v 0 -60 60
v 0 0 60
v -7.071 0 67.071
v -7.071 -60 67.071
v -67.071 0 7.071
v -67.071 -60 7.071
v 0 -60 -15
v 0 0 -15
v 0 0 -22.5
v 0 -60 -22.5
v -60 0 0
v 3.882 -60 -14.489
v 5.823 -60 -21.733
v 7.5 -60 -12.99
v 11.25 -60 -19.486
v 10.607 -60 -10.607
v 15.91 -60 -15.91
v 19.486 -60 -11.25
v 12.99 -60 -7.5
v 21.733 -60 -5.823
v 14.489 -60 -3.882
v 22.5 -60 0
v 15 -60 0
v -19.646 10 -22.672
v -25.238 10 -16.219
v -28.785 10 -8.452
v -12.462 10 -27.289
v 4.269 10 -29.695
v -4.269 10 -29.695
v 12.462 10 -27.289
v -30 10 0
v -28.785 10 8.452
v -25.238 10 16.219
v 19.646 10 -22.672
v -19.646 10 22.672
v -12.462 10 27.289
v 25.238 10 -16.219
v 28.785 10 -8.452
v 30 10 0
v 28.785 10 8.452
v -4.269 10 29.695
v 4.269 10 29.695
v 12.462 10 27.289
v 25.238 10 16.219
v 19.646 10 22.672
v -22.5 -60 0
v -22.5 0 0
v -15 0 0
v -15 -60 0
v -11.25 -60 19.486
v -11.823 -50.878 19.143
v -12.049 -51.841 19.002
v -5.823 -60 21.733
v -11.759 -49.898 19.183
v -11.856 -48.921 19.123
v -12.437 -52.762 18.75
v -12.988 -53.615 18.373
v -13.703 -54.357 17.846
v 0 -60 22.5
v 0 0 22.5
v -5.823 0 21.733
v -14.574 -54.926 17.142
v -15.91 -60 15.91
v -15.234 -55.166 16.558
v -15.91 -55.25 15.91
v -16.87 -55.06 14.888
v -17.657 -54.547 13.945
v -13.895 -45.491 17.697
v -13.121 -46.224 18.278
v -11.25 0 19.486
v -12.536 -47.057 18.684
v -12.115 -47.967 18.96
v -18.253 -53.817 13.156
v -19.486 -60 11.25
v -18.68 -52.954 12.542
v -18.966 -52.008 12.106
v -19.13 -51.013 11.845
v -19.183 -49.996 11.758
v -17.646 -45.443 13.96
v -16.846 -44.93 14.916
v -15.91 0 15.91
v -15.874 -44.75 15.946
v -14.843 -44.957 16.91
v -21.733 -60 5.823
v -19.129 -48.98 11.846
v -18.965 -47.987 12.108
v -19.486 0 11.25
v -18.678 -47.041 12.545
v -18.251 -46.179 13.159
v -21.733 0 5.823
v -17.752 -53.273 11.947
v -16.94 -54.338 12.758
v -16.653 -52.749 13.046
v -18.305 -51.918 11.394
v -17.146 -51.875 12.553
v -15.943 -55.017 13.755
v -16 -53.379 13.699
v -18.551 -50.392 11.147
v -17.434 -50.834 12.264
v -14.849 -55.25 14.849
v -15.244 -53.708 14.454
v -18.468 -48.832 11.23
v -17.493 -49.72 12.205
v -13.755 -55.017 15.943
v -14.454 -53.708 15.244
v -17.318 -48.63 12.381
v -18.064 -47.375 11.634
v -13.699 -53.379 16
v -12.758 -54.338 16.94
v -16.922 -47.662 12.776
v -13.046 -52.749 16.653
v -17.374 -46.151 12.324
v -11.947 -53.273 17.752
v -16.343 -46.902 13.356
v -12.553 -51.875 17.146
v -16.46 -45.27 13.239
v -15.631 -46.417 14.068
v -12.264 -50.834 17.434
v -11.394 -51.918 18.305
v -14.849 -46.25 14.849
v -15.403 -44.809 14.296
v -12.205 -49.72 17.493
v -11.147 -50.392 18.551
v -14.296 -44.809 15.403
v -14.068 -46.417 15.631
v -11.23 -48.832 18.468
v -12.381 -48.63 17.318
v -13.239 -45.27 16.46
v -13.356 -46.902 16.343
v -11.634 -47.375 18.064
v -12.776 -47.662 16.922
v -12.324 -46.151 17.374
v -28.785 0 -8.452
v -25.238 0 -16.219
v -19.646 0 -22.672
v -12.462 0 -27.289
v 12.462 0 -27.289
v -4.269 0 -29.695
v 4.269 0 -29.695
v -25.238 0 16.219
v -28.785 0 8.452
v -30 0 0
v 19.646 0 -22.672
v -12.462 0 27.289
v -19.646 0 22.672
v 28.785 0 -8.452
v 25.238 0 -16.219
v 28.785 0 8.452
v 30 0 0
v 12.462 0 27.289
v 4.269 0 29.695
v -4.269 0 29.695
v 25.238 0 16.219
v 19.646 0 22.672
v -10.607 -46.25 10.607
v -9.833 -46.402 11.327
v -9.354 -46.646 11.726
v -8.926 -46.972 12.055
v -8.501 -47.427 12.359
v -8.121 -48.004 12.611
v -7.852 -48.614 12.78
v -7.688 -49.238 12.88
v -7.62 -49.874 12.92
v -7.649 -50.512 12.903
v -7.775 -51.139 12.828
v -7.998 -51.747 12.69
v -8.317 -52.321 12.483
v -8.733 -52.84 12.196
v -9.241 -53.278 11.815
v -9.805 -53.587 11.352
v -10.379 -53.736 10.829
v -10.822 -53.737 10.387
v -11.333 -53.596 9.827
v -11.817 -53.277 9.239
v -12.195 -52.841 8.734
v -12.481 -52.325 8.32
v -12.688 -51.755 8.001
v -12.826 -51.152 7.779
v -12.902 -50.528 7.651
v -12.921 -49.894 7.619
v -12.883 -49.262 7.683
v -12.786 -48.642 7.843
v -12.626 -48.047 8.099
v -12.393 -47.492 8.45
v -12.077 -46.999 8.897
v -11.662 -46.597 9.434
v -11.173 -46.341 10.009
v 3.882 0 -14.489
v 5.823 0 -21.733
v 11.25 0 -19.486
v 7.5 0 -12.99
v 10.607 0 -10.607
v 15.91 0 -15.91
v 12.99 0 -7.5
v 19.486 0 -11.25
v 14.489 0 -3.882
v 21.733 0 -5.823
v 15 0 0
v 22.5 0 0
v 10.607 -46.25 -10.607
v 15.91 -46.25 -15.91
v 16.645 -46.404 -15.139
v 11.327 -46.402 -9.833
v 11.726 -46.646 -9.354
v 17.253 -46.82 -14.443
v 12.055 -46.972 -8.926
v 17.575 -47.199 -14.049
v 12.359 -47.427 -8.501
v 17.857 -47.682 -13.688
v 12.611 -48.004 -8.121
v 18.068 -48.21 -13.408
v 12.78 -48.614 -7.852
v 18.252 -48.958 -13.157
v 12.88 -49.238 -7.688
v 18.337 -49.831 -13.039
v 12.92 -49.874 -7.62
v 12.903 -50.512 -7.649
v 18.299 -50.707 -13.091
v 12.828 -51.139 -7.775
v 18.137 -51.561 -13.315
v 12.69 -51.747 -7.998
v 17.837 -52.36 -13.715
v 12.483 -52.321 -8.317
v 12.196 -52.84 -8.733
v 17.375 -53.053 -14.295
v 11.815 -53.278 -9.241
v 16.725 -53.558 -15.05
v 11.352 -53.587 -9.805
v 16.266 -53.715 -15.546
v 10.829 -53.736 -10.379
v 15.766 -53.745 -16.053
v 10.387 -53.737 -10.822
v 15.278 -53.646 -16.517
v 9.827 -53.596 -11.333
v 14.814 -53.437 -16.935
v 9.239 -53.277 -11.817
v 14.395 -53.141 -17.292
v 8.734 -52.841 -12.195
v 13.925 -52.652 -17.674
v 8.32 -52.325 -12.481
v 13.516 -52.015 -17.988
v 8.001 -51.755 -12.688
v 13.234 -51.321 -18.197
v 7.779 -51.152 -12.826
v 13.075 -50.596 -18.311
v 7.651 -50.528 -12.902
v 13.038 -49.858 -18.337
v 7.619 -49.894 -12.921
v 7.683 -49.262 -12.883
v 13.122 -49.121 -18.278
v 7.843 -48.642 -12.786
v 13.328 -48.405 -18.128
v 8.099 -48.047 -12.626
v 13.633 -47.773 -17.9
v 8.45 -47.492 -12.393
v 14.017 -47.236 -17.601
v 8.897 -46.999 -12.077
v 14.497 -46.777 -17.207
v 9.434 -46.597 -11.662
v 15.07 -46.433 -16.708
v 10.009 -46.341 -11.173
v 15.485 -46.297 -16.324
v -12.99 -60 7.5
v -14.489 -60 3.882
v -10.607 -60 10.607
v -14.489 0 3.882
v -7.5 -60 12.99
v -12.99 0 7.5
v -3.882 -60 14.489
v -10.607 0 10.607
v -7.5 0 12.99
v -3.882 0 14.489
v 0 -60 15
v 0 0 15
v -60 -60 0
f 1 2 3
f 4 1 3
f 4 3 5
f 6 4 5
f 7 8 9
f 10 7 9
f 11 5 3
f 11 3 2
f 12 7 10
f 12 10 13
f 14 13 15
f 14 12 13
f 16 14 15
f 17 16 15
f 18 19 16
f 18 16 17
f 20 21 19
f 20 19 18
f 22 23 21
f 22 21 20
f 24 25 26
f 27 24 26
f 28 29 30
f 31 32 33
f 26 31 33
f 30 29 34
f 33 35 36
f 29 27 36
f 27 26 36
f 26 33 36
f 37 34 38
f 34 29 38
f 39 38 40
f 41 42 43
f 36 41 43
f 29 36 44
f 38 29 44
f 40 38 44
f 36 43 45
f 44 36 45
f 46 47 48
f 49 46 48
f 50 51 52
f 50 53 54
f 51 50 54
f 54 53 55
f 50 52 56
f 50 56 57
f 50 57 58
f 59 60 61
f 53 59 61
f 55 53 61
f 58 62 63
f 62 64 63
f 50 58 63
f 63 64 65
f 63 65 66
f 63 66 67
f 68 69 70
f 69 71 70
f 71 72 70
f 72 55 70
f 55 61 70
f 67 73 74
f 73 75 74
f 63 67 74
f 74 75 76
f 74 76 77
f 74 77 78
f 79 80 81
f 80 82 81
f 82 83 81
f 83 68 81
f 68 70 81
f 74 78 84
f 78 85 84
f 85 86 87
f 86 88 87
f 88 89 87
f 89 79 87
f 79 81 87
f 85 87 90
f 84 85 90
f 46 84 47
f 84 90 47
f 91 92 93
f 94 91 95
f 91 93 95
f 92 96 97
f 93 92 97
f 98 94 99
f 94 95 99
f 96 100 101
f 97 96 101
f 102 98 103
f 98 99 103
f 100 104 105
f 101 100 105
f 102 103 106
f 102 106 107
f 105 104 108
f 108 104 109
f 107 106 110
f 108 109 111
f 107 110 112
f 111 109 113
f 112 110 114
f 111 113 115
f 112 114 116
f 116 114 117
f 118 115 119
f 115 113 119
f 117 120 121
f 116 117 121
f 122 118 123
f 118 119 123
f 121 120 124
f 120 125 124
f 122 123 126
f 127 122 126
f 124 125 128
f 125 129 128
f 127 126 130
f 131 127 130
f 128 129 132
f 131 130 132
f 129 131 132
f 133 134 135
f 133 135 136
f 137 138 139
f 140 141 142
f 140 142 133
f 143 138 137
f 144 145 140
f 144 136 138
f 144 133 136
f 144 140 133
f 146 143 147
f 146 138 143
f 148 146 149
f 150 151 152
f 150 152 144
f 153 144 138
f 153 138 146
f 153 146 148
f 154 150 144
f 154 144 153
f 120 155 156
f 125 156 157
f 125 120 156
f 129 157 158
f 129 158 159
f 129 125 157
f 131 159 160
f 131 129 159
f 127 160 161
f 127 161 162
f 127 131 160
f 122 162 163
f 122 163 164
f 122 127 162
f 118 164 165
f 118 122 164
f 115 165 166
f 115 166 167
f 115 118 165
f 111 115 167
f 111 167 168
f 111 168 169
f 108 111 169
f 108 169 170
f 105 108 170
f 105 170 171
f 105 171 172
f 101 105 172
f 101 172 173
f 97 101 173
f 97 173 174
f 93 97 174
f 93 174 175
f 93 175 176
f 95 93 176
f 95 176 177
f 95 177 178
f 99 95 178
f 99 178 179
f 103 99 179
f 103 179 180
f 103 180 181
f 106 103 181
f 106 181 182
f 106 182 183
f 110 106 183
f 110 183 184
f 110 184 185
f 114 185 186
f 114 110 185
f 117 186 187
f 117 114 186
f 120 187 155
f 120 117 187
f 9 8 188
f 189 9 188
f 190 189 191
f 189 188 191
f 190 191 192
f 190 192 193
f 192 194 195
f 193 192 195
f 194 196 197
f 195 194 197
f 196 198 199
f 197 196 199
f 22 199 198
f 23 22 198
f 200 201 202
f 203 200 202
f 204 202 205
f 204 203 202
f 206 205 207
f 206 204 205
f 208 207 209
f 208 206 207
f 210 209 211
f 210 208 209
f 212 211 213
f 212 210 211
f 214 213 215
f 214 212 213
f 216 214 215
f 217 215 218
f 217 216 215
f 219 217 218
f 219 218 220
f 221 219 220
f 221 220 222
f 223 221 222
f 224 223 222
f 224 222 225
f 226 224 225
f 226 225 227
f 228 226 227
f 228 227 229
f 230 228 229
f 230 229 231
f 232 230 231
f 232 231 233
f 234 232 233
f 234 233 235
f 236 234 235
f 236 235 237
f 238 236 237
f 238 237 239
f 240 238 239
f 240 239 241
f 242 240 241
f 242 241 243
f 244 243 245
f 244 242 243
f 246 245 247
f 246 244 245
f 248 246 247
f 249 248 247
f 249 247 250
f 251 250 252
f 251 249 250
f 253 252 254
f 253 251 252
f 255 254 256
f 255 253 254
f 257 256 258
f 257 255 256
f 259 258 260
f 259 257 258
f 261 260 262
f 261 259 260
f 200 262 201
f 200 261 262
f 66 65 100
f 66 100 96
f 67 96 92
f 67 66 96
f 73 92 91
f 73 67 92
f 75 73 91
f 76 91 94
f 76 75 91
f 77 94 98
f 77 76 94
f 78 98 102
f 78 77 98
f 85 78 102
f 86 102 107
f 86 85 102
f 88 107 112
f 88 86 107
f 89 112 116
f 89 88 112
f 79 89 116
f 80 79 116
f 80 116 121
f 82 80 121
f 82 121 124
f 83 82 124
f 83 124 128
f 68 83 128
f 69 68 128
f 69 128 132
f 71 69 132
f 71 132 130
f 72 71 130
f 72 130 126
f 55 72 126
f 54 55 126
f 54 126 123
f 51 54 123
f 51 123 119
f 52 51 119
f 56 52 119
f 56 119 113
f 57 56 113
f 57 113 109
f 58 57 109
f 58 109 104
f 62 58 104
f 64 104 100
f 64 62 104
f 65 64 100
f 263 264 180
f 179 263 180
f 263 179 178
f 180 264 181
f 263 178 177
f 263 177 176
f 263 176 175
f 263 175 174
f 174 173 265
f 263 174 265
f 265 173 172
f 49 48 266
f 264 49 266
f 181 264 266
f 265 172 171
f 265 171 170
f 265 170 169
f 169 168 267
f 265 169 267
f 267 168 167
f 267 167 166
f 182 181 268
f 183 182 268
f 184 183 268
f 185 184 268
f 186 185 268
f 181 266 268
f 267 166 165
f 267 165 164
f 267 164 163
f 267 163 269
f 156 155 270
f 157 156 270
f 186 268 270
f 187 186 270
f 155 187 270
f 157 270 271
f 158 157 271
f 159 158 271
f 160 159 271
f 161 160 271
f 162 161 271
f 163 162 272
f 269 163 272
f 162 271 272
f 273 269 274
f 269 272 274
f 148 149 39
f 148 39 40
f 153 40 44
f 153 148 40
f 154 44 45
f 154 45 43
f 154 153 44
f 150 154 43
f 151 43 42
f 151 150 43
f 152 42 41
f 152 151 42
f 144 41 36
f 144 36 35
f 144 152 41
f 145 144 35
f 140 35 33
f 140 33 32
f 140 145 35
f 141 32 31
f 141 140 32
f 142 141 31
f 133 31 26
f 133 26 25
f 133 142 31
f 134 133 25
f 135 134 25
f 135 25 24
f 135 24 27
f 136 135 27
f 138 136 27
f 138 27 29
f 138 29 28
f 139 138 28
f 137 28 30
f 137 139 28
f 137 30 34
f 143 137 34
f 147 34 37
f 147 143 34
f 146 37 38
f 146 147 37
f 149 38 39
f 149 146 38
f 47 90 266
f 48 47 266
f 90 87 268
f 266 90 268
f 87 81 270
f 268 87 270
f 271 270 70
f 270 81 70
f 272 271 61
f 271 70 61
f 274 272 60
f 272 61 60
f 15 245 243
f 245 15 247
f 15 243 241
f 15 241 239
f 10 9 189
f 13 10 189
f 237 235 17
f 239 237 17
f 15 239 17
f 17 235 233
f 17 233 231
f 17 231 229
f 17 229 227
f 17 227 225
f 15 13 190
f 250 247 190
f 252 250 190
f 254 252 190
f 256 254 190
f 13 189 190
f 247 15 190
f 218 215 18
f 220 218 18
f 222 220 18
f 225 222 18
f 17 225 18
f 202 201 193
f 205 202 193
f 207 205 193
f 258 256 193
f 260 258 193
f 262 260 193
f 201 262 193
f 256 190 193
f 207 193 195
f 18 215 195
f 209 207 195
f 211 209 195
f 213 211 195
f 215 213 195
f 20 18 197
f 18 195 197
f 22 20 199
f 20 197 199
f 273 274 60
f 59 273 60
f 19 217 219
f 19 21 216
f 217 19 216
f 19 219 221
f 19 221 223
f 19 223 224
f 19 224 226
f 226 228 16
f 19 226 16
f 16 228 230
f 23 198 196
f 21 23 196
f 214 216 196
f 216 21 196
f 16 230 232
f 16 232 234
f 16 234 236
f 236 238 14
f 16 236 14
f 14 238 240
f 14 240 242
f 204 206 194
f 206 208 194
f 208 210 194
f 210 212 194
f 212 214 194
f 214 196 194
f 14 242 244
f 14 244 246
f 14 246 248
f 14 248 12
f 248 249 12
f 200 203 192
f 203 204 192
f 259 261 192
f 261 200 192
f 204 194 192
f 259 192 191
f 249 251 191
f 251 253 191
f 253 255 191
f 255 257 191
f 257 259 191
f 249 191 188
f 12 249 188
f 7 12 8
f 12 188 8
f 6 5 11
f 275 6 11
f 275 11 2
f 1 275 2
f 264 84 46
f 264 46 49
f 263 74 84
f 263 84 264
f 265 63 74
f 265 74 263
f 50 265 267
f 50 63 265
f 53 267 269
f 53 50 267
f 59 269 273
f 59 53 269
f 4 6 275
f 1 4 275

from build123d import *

# Parameters (mm, degrees)
F1_DEPTH = 60
F0_R     = 30
F2_DEPTH = 10
F4_DEPTH = 60
F6_DEPTH = 75
F7_DEPTH = 21.42641


with BuildPart() as f1:
    # F0 (on Front) → F1 (new body)
    with BuildSketch(Plane.XZ):
        with BuildLine():
            ThreePointArc((-15, 0), (-10.6066017178, 10.6066017178), (0, 15))
            Line((0, 15), (0, 22.5))
            ThreePointArc((0, 22.5), (-15.9099025767, 15.9099025767), (-22.5, 0))
            Line((-22.5, 0), (-15, 0))
        make_face()
    extrude(amount=F1_DEPTH)


with BuildPart() as f1b:
    # F0 (on Front) → F1, piece 2 (new body)
    with BuildSketch(Plane.XZ):
        with BuildLine():
            ThreePointArc((15, 0), (10.6066017178, -10.6066017178), (0, -15))
            Line((0, -15), (0, -22.5))
            ThreePointArc((0, -22.5), (15.9099025767, -15.9099025767), (22.5, 0))
            Line((22.5, 0), (15, 0))
        make_face()
    extrude(amount=F1_DEPTH)


with BuildPart() as f2:
    # F0 (on Front) → F2 (new body)
    with BuildSketch(Plane.XZ):
        Circle(F0_R)
        with BuildLine():
            Line((0, -22.5), (0, -15))
            ThreePointArc((0, -15), (10.6066017178, -10.6066017178), (15, 0))
            Line((15, 0), (22.5, 0))
            ThreePointArc((22.5, 0), (15.9099025767, -15.9099025767), (0, -22.5))
        make_face(mode=Mode.SUBTRACT)
        with BuildLine():
            Line((0, 22.5), (0, 15))
            ThreePointArc((0, 15), (-10.6066017178, 10.6066017178), (-15, 0))
            Line((-15, 0), (-22.5, 0))
            ThreePointArc((-22.5, 0), (-15.9099025767, 15.9099025767), (0, 22.5))
        make_face(mode=Mode.SUBTRACT)
        with BuildLine():
            ThreePointArc((-15, 0), (-10.6066017178, 10.6066017178), (0, 15))
            Line((0, 15), (0, 22.5))
            ThreePointArc((0, 22.5), (-15.9099025767, 15.9099025767), (-22.5, 0))
            Line((-22.5, 0), (-15, 0))
        make_face()
        with BuildLine():
            ThreePointArc((15, 0), (10.6066017178, -10.6066017178), (0, -15))
            Line((0, -15), (0, -22.5))
            ThreePointArc((0, -22.5), (15.9099025767, -15.9099025767), (22.5, 0))
            Line((22.5, 0), (15, 0))
        make_face()
    extrude(amount=-F2_DEPTH)


with BuildPart() as f4:
    # F3 (on Front) → F4 (new body)
    with BuildSketch(Plane.XZ):
        Polygon((-30, 30), (0, 60), (-7.0710678119, 67.0710678119), (-67.0710678119, 7.0710678119), (-60, 0), align=None)
    extrude(amount=F4_DEPTH)


with BuildPart() as f6_tool:
    # F5 (on face) → F6 (new body)
    with BuildSketch(Plane(origin=(-30, 0, 30), x_dir=(0, 1, 0), z_dir=(0.7071067812, 0, -0.7071067812))):
        with BuildLine():
            Line((-46.25, 0), (-53.75, 0))
            ThreePointArc((-53.75, 0), (-50, -3.75), (-46.25, 0))
        make_face()
        with BuildLine():
            ThreePointArc((-46.25, 0), (-50, 3.75), (-53.75, 0))
            Line((-53.75, 0), (-46.25, 0))
        make_face()
    extrude(amount=F6_DEPTH)


with BuildPart() as f1_1:
    add(f1.part)

    # F6: cut by f6_tool
    add(f6_tool.part, mode=Mode.SUBTRACT)

    # F5 (on face) → F7 (cut)
    with BuildSketch(Plane(origin=(-30, 0, 30), x_dir=(0, 1, 0), z_dir=(0.7071067812, 0, -0.7071067812))):
        with BuildLine():
            ThreePointArc((-44.75, 0), (-50, 5.25), (-55.25, 0))
            Line((-55.25, 0), (-53.75, 0))
            ThreePointArc((-53.75, 0), (-50, 3.75), (-46.25, 0))
            Line((-46.25, 0), (-44.75, 0))
        make_face()
        with BuildLine():
            Line((-53.75, 0), (-55.25, 0))
            ThreePointArc((-55.25, 0), (-50, -5.25), (-44.75, 0))
            Line((-44.75, 0), (-46.25, 0))
            ThreePointArc((-46.25, 0), (-50, -3.75), (-53.75, 0))
        make_face()
    extrude(amount=F7_DEPTH, mode=Mode.SUBTRACT)


with BuildPart() as f1b_1:
    add(f1b.part)

    # F6: cut by f6_tool
    add(f6_tool.part, mode=Mode.SUBTRACT)


solid = Compound([f2.part, f4.part, f1_1.part, f1b_1.part])
